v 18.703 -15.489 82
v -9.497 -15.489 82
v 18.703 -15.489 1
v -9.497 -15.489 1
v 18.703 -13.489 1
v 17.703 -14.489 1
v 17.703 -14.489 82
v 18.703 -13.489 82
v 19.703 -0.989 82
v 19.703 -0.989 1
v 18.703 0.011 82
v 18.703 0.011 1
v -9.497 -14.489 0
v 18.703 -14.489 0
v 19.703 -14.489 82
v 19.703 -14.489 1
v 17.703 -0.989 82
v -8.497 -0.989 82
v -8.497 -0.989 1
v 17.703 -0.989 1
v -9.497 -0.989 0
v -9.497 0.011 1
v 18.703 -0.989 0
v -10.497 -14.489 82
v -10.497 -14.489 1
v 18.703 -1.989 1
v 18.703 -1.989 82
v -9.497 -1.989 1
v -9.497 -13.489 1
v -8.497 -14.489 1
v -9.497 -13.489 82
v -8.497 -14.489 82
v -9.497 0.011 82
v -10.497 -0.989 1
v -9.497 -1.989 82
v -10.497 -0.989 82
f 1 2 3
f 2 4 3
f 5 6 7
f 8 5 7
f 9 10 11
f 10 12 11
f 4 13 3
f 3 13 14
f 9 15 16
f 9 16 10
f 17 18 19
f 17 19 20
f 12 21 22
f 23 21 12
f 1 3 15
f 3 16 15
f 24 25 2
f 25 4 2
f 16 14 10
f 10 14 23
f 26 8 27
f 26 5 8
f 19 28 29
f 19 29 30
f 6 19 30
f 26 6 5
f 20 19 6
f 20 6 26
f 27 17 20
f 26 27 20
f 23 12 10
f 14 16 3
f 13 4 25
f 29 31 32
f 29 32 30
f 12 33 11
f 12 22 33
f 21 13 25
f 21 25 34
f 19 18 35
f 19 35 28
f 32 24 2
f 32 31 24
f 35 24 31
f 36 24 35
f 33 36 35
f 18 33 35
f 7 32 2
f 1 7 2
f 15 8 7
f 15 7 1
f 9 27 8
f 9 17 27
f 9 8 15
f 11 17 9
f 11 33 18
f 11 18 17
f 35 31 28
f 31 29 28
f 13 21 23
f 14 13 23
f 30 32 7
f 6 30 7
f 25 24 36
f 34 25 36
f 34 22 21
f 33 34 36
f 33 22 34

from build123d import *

# Parameters (mm, degrees)
F0_W     = 30.2
F0_H     = 15.5
F1_DEPTH = 82
F2_T     = -1
F3_SIZE  = 1
F4_SIZE  = 1


with BuildPart() as f1:
    # F0 (on Top) → F1 (new body)
    with BuildSketch(Plane.XY):
        with Locations((4.6029518125, -7.7385634869)):
            Rectangle(F0_W, F0_H)
    extrude(amount=F1_DEPTH)

    # F2
    f2_openings = [f1.faces().sort_by_distance(p)[0] for p in [
        (4.602952, -7.738563, 82),
    ]]
    offset(amount=F2_T, openings=f2_openings)

    # F3
    f3_edges = [f1.edges().sort_by_distance(p)[0] for p in [
        (19.702952, 0.011437, 41),
        (19.702952, -15.488563, 41),
        (-10.497048, 0.011437, 41),
        (-10.497048, -15.488563, 41),
        (4.602952, 0.011437, 0),
        (19.702952, -7.738563, 0),
        (4.602952, -15.488563, 0),
        (-10.497048, -7.738563, 0),
    ]]
    chamfer(f3_edges, length=F3_SIZE)

    # F4
    f4_edges = [f1.edges().sort_by_distance(p)[0] for p in [
        (-9.497048, -0.988563, 41.5),
        (18.702952, -0.988563, 41.5),
        (18.702952, -14.488563, 41.5),
        (-9.497048, -14.488563, 41.5),
    ]]
    chamfer(f4_edges, length=F4_SIZE)


solid = f1.part
